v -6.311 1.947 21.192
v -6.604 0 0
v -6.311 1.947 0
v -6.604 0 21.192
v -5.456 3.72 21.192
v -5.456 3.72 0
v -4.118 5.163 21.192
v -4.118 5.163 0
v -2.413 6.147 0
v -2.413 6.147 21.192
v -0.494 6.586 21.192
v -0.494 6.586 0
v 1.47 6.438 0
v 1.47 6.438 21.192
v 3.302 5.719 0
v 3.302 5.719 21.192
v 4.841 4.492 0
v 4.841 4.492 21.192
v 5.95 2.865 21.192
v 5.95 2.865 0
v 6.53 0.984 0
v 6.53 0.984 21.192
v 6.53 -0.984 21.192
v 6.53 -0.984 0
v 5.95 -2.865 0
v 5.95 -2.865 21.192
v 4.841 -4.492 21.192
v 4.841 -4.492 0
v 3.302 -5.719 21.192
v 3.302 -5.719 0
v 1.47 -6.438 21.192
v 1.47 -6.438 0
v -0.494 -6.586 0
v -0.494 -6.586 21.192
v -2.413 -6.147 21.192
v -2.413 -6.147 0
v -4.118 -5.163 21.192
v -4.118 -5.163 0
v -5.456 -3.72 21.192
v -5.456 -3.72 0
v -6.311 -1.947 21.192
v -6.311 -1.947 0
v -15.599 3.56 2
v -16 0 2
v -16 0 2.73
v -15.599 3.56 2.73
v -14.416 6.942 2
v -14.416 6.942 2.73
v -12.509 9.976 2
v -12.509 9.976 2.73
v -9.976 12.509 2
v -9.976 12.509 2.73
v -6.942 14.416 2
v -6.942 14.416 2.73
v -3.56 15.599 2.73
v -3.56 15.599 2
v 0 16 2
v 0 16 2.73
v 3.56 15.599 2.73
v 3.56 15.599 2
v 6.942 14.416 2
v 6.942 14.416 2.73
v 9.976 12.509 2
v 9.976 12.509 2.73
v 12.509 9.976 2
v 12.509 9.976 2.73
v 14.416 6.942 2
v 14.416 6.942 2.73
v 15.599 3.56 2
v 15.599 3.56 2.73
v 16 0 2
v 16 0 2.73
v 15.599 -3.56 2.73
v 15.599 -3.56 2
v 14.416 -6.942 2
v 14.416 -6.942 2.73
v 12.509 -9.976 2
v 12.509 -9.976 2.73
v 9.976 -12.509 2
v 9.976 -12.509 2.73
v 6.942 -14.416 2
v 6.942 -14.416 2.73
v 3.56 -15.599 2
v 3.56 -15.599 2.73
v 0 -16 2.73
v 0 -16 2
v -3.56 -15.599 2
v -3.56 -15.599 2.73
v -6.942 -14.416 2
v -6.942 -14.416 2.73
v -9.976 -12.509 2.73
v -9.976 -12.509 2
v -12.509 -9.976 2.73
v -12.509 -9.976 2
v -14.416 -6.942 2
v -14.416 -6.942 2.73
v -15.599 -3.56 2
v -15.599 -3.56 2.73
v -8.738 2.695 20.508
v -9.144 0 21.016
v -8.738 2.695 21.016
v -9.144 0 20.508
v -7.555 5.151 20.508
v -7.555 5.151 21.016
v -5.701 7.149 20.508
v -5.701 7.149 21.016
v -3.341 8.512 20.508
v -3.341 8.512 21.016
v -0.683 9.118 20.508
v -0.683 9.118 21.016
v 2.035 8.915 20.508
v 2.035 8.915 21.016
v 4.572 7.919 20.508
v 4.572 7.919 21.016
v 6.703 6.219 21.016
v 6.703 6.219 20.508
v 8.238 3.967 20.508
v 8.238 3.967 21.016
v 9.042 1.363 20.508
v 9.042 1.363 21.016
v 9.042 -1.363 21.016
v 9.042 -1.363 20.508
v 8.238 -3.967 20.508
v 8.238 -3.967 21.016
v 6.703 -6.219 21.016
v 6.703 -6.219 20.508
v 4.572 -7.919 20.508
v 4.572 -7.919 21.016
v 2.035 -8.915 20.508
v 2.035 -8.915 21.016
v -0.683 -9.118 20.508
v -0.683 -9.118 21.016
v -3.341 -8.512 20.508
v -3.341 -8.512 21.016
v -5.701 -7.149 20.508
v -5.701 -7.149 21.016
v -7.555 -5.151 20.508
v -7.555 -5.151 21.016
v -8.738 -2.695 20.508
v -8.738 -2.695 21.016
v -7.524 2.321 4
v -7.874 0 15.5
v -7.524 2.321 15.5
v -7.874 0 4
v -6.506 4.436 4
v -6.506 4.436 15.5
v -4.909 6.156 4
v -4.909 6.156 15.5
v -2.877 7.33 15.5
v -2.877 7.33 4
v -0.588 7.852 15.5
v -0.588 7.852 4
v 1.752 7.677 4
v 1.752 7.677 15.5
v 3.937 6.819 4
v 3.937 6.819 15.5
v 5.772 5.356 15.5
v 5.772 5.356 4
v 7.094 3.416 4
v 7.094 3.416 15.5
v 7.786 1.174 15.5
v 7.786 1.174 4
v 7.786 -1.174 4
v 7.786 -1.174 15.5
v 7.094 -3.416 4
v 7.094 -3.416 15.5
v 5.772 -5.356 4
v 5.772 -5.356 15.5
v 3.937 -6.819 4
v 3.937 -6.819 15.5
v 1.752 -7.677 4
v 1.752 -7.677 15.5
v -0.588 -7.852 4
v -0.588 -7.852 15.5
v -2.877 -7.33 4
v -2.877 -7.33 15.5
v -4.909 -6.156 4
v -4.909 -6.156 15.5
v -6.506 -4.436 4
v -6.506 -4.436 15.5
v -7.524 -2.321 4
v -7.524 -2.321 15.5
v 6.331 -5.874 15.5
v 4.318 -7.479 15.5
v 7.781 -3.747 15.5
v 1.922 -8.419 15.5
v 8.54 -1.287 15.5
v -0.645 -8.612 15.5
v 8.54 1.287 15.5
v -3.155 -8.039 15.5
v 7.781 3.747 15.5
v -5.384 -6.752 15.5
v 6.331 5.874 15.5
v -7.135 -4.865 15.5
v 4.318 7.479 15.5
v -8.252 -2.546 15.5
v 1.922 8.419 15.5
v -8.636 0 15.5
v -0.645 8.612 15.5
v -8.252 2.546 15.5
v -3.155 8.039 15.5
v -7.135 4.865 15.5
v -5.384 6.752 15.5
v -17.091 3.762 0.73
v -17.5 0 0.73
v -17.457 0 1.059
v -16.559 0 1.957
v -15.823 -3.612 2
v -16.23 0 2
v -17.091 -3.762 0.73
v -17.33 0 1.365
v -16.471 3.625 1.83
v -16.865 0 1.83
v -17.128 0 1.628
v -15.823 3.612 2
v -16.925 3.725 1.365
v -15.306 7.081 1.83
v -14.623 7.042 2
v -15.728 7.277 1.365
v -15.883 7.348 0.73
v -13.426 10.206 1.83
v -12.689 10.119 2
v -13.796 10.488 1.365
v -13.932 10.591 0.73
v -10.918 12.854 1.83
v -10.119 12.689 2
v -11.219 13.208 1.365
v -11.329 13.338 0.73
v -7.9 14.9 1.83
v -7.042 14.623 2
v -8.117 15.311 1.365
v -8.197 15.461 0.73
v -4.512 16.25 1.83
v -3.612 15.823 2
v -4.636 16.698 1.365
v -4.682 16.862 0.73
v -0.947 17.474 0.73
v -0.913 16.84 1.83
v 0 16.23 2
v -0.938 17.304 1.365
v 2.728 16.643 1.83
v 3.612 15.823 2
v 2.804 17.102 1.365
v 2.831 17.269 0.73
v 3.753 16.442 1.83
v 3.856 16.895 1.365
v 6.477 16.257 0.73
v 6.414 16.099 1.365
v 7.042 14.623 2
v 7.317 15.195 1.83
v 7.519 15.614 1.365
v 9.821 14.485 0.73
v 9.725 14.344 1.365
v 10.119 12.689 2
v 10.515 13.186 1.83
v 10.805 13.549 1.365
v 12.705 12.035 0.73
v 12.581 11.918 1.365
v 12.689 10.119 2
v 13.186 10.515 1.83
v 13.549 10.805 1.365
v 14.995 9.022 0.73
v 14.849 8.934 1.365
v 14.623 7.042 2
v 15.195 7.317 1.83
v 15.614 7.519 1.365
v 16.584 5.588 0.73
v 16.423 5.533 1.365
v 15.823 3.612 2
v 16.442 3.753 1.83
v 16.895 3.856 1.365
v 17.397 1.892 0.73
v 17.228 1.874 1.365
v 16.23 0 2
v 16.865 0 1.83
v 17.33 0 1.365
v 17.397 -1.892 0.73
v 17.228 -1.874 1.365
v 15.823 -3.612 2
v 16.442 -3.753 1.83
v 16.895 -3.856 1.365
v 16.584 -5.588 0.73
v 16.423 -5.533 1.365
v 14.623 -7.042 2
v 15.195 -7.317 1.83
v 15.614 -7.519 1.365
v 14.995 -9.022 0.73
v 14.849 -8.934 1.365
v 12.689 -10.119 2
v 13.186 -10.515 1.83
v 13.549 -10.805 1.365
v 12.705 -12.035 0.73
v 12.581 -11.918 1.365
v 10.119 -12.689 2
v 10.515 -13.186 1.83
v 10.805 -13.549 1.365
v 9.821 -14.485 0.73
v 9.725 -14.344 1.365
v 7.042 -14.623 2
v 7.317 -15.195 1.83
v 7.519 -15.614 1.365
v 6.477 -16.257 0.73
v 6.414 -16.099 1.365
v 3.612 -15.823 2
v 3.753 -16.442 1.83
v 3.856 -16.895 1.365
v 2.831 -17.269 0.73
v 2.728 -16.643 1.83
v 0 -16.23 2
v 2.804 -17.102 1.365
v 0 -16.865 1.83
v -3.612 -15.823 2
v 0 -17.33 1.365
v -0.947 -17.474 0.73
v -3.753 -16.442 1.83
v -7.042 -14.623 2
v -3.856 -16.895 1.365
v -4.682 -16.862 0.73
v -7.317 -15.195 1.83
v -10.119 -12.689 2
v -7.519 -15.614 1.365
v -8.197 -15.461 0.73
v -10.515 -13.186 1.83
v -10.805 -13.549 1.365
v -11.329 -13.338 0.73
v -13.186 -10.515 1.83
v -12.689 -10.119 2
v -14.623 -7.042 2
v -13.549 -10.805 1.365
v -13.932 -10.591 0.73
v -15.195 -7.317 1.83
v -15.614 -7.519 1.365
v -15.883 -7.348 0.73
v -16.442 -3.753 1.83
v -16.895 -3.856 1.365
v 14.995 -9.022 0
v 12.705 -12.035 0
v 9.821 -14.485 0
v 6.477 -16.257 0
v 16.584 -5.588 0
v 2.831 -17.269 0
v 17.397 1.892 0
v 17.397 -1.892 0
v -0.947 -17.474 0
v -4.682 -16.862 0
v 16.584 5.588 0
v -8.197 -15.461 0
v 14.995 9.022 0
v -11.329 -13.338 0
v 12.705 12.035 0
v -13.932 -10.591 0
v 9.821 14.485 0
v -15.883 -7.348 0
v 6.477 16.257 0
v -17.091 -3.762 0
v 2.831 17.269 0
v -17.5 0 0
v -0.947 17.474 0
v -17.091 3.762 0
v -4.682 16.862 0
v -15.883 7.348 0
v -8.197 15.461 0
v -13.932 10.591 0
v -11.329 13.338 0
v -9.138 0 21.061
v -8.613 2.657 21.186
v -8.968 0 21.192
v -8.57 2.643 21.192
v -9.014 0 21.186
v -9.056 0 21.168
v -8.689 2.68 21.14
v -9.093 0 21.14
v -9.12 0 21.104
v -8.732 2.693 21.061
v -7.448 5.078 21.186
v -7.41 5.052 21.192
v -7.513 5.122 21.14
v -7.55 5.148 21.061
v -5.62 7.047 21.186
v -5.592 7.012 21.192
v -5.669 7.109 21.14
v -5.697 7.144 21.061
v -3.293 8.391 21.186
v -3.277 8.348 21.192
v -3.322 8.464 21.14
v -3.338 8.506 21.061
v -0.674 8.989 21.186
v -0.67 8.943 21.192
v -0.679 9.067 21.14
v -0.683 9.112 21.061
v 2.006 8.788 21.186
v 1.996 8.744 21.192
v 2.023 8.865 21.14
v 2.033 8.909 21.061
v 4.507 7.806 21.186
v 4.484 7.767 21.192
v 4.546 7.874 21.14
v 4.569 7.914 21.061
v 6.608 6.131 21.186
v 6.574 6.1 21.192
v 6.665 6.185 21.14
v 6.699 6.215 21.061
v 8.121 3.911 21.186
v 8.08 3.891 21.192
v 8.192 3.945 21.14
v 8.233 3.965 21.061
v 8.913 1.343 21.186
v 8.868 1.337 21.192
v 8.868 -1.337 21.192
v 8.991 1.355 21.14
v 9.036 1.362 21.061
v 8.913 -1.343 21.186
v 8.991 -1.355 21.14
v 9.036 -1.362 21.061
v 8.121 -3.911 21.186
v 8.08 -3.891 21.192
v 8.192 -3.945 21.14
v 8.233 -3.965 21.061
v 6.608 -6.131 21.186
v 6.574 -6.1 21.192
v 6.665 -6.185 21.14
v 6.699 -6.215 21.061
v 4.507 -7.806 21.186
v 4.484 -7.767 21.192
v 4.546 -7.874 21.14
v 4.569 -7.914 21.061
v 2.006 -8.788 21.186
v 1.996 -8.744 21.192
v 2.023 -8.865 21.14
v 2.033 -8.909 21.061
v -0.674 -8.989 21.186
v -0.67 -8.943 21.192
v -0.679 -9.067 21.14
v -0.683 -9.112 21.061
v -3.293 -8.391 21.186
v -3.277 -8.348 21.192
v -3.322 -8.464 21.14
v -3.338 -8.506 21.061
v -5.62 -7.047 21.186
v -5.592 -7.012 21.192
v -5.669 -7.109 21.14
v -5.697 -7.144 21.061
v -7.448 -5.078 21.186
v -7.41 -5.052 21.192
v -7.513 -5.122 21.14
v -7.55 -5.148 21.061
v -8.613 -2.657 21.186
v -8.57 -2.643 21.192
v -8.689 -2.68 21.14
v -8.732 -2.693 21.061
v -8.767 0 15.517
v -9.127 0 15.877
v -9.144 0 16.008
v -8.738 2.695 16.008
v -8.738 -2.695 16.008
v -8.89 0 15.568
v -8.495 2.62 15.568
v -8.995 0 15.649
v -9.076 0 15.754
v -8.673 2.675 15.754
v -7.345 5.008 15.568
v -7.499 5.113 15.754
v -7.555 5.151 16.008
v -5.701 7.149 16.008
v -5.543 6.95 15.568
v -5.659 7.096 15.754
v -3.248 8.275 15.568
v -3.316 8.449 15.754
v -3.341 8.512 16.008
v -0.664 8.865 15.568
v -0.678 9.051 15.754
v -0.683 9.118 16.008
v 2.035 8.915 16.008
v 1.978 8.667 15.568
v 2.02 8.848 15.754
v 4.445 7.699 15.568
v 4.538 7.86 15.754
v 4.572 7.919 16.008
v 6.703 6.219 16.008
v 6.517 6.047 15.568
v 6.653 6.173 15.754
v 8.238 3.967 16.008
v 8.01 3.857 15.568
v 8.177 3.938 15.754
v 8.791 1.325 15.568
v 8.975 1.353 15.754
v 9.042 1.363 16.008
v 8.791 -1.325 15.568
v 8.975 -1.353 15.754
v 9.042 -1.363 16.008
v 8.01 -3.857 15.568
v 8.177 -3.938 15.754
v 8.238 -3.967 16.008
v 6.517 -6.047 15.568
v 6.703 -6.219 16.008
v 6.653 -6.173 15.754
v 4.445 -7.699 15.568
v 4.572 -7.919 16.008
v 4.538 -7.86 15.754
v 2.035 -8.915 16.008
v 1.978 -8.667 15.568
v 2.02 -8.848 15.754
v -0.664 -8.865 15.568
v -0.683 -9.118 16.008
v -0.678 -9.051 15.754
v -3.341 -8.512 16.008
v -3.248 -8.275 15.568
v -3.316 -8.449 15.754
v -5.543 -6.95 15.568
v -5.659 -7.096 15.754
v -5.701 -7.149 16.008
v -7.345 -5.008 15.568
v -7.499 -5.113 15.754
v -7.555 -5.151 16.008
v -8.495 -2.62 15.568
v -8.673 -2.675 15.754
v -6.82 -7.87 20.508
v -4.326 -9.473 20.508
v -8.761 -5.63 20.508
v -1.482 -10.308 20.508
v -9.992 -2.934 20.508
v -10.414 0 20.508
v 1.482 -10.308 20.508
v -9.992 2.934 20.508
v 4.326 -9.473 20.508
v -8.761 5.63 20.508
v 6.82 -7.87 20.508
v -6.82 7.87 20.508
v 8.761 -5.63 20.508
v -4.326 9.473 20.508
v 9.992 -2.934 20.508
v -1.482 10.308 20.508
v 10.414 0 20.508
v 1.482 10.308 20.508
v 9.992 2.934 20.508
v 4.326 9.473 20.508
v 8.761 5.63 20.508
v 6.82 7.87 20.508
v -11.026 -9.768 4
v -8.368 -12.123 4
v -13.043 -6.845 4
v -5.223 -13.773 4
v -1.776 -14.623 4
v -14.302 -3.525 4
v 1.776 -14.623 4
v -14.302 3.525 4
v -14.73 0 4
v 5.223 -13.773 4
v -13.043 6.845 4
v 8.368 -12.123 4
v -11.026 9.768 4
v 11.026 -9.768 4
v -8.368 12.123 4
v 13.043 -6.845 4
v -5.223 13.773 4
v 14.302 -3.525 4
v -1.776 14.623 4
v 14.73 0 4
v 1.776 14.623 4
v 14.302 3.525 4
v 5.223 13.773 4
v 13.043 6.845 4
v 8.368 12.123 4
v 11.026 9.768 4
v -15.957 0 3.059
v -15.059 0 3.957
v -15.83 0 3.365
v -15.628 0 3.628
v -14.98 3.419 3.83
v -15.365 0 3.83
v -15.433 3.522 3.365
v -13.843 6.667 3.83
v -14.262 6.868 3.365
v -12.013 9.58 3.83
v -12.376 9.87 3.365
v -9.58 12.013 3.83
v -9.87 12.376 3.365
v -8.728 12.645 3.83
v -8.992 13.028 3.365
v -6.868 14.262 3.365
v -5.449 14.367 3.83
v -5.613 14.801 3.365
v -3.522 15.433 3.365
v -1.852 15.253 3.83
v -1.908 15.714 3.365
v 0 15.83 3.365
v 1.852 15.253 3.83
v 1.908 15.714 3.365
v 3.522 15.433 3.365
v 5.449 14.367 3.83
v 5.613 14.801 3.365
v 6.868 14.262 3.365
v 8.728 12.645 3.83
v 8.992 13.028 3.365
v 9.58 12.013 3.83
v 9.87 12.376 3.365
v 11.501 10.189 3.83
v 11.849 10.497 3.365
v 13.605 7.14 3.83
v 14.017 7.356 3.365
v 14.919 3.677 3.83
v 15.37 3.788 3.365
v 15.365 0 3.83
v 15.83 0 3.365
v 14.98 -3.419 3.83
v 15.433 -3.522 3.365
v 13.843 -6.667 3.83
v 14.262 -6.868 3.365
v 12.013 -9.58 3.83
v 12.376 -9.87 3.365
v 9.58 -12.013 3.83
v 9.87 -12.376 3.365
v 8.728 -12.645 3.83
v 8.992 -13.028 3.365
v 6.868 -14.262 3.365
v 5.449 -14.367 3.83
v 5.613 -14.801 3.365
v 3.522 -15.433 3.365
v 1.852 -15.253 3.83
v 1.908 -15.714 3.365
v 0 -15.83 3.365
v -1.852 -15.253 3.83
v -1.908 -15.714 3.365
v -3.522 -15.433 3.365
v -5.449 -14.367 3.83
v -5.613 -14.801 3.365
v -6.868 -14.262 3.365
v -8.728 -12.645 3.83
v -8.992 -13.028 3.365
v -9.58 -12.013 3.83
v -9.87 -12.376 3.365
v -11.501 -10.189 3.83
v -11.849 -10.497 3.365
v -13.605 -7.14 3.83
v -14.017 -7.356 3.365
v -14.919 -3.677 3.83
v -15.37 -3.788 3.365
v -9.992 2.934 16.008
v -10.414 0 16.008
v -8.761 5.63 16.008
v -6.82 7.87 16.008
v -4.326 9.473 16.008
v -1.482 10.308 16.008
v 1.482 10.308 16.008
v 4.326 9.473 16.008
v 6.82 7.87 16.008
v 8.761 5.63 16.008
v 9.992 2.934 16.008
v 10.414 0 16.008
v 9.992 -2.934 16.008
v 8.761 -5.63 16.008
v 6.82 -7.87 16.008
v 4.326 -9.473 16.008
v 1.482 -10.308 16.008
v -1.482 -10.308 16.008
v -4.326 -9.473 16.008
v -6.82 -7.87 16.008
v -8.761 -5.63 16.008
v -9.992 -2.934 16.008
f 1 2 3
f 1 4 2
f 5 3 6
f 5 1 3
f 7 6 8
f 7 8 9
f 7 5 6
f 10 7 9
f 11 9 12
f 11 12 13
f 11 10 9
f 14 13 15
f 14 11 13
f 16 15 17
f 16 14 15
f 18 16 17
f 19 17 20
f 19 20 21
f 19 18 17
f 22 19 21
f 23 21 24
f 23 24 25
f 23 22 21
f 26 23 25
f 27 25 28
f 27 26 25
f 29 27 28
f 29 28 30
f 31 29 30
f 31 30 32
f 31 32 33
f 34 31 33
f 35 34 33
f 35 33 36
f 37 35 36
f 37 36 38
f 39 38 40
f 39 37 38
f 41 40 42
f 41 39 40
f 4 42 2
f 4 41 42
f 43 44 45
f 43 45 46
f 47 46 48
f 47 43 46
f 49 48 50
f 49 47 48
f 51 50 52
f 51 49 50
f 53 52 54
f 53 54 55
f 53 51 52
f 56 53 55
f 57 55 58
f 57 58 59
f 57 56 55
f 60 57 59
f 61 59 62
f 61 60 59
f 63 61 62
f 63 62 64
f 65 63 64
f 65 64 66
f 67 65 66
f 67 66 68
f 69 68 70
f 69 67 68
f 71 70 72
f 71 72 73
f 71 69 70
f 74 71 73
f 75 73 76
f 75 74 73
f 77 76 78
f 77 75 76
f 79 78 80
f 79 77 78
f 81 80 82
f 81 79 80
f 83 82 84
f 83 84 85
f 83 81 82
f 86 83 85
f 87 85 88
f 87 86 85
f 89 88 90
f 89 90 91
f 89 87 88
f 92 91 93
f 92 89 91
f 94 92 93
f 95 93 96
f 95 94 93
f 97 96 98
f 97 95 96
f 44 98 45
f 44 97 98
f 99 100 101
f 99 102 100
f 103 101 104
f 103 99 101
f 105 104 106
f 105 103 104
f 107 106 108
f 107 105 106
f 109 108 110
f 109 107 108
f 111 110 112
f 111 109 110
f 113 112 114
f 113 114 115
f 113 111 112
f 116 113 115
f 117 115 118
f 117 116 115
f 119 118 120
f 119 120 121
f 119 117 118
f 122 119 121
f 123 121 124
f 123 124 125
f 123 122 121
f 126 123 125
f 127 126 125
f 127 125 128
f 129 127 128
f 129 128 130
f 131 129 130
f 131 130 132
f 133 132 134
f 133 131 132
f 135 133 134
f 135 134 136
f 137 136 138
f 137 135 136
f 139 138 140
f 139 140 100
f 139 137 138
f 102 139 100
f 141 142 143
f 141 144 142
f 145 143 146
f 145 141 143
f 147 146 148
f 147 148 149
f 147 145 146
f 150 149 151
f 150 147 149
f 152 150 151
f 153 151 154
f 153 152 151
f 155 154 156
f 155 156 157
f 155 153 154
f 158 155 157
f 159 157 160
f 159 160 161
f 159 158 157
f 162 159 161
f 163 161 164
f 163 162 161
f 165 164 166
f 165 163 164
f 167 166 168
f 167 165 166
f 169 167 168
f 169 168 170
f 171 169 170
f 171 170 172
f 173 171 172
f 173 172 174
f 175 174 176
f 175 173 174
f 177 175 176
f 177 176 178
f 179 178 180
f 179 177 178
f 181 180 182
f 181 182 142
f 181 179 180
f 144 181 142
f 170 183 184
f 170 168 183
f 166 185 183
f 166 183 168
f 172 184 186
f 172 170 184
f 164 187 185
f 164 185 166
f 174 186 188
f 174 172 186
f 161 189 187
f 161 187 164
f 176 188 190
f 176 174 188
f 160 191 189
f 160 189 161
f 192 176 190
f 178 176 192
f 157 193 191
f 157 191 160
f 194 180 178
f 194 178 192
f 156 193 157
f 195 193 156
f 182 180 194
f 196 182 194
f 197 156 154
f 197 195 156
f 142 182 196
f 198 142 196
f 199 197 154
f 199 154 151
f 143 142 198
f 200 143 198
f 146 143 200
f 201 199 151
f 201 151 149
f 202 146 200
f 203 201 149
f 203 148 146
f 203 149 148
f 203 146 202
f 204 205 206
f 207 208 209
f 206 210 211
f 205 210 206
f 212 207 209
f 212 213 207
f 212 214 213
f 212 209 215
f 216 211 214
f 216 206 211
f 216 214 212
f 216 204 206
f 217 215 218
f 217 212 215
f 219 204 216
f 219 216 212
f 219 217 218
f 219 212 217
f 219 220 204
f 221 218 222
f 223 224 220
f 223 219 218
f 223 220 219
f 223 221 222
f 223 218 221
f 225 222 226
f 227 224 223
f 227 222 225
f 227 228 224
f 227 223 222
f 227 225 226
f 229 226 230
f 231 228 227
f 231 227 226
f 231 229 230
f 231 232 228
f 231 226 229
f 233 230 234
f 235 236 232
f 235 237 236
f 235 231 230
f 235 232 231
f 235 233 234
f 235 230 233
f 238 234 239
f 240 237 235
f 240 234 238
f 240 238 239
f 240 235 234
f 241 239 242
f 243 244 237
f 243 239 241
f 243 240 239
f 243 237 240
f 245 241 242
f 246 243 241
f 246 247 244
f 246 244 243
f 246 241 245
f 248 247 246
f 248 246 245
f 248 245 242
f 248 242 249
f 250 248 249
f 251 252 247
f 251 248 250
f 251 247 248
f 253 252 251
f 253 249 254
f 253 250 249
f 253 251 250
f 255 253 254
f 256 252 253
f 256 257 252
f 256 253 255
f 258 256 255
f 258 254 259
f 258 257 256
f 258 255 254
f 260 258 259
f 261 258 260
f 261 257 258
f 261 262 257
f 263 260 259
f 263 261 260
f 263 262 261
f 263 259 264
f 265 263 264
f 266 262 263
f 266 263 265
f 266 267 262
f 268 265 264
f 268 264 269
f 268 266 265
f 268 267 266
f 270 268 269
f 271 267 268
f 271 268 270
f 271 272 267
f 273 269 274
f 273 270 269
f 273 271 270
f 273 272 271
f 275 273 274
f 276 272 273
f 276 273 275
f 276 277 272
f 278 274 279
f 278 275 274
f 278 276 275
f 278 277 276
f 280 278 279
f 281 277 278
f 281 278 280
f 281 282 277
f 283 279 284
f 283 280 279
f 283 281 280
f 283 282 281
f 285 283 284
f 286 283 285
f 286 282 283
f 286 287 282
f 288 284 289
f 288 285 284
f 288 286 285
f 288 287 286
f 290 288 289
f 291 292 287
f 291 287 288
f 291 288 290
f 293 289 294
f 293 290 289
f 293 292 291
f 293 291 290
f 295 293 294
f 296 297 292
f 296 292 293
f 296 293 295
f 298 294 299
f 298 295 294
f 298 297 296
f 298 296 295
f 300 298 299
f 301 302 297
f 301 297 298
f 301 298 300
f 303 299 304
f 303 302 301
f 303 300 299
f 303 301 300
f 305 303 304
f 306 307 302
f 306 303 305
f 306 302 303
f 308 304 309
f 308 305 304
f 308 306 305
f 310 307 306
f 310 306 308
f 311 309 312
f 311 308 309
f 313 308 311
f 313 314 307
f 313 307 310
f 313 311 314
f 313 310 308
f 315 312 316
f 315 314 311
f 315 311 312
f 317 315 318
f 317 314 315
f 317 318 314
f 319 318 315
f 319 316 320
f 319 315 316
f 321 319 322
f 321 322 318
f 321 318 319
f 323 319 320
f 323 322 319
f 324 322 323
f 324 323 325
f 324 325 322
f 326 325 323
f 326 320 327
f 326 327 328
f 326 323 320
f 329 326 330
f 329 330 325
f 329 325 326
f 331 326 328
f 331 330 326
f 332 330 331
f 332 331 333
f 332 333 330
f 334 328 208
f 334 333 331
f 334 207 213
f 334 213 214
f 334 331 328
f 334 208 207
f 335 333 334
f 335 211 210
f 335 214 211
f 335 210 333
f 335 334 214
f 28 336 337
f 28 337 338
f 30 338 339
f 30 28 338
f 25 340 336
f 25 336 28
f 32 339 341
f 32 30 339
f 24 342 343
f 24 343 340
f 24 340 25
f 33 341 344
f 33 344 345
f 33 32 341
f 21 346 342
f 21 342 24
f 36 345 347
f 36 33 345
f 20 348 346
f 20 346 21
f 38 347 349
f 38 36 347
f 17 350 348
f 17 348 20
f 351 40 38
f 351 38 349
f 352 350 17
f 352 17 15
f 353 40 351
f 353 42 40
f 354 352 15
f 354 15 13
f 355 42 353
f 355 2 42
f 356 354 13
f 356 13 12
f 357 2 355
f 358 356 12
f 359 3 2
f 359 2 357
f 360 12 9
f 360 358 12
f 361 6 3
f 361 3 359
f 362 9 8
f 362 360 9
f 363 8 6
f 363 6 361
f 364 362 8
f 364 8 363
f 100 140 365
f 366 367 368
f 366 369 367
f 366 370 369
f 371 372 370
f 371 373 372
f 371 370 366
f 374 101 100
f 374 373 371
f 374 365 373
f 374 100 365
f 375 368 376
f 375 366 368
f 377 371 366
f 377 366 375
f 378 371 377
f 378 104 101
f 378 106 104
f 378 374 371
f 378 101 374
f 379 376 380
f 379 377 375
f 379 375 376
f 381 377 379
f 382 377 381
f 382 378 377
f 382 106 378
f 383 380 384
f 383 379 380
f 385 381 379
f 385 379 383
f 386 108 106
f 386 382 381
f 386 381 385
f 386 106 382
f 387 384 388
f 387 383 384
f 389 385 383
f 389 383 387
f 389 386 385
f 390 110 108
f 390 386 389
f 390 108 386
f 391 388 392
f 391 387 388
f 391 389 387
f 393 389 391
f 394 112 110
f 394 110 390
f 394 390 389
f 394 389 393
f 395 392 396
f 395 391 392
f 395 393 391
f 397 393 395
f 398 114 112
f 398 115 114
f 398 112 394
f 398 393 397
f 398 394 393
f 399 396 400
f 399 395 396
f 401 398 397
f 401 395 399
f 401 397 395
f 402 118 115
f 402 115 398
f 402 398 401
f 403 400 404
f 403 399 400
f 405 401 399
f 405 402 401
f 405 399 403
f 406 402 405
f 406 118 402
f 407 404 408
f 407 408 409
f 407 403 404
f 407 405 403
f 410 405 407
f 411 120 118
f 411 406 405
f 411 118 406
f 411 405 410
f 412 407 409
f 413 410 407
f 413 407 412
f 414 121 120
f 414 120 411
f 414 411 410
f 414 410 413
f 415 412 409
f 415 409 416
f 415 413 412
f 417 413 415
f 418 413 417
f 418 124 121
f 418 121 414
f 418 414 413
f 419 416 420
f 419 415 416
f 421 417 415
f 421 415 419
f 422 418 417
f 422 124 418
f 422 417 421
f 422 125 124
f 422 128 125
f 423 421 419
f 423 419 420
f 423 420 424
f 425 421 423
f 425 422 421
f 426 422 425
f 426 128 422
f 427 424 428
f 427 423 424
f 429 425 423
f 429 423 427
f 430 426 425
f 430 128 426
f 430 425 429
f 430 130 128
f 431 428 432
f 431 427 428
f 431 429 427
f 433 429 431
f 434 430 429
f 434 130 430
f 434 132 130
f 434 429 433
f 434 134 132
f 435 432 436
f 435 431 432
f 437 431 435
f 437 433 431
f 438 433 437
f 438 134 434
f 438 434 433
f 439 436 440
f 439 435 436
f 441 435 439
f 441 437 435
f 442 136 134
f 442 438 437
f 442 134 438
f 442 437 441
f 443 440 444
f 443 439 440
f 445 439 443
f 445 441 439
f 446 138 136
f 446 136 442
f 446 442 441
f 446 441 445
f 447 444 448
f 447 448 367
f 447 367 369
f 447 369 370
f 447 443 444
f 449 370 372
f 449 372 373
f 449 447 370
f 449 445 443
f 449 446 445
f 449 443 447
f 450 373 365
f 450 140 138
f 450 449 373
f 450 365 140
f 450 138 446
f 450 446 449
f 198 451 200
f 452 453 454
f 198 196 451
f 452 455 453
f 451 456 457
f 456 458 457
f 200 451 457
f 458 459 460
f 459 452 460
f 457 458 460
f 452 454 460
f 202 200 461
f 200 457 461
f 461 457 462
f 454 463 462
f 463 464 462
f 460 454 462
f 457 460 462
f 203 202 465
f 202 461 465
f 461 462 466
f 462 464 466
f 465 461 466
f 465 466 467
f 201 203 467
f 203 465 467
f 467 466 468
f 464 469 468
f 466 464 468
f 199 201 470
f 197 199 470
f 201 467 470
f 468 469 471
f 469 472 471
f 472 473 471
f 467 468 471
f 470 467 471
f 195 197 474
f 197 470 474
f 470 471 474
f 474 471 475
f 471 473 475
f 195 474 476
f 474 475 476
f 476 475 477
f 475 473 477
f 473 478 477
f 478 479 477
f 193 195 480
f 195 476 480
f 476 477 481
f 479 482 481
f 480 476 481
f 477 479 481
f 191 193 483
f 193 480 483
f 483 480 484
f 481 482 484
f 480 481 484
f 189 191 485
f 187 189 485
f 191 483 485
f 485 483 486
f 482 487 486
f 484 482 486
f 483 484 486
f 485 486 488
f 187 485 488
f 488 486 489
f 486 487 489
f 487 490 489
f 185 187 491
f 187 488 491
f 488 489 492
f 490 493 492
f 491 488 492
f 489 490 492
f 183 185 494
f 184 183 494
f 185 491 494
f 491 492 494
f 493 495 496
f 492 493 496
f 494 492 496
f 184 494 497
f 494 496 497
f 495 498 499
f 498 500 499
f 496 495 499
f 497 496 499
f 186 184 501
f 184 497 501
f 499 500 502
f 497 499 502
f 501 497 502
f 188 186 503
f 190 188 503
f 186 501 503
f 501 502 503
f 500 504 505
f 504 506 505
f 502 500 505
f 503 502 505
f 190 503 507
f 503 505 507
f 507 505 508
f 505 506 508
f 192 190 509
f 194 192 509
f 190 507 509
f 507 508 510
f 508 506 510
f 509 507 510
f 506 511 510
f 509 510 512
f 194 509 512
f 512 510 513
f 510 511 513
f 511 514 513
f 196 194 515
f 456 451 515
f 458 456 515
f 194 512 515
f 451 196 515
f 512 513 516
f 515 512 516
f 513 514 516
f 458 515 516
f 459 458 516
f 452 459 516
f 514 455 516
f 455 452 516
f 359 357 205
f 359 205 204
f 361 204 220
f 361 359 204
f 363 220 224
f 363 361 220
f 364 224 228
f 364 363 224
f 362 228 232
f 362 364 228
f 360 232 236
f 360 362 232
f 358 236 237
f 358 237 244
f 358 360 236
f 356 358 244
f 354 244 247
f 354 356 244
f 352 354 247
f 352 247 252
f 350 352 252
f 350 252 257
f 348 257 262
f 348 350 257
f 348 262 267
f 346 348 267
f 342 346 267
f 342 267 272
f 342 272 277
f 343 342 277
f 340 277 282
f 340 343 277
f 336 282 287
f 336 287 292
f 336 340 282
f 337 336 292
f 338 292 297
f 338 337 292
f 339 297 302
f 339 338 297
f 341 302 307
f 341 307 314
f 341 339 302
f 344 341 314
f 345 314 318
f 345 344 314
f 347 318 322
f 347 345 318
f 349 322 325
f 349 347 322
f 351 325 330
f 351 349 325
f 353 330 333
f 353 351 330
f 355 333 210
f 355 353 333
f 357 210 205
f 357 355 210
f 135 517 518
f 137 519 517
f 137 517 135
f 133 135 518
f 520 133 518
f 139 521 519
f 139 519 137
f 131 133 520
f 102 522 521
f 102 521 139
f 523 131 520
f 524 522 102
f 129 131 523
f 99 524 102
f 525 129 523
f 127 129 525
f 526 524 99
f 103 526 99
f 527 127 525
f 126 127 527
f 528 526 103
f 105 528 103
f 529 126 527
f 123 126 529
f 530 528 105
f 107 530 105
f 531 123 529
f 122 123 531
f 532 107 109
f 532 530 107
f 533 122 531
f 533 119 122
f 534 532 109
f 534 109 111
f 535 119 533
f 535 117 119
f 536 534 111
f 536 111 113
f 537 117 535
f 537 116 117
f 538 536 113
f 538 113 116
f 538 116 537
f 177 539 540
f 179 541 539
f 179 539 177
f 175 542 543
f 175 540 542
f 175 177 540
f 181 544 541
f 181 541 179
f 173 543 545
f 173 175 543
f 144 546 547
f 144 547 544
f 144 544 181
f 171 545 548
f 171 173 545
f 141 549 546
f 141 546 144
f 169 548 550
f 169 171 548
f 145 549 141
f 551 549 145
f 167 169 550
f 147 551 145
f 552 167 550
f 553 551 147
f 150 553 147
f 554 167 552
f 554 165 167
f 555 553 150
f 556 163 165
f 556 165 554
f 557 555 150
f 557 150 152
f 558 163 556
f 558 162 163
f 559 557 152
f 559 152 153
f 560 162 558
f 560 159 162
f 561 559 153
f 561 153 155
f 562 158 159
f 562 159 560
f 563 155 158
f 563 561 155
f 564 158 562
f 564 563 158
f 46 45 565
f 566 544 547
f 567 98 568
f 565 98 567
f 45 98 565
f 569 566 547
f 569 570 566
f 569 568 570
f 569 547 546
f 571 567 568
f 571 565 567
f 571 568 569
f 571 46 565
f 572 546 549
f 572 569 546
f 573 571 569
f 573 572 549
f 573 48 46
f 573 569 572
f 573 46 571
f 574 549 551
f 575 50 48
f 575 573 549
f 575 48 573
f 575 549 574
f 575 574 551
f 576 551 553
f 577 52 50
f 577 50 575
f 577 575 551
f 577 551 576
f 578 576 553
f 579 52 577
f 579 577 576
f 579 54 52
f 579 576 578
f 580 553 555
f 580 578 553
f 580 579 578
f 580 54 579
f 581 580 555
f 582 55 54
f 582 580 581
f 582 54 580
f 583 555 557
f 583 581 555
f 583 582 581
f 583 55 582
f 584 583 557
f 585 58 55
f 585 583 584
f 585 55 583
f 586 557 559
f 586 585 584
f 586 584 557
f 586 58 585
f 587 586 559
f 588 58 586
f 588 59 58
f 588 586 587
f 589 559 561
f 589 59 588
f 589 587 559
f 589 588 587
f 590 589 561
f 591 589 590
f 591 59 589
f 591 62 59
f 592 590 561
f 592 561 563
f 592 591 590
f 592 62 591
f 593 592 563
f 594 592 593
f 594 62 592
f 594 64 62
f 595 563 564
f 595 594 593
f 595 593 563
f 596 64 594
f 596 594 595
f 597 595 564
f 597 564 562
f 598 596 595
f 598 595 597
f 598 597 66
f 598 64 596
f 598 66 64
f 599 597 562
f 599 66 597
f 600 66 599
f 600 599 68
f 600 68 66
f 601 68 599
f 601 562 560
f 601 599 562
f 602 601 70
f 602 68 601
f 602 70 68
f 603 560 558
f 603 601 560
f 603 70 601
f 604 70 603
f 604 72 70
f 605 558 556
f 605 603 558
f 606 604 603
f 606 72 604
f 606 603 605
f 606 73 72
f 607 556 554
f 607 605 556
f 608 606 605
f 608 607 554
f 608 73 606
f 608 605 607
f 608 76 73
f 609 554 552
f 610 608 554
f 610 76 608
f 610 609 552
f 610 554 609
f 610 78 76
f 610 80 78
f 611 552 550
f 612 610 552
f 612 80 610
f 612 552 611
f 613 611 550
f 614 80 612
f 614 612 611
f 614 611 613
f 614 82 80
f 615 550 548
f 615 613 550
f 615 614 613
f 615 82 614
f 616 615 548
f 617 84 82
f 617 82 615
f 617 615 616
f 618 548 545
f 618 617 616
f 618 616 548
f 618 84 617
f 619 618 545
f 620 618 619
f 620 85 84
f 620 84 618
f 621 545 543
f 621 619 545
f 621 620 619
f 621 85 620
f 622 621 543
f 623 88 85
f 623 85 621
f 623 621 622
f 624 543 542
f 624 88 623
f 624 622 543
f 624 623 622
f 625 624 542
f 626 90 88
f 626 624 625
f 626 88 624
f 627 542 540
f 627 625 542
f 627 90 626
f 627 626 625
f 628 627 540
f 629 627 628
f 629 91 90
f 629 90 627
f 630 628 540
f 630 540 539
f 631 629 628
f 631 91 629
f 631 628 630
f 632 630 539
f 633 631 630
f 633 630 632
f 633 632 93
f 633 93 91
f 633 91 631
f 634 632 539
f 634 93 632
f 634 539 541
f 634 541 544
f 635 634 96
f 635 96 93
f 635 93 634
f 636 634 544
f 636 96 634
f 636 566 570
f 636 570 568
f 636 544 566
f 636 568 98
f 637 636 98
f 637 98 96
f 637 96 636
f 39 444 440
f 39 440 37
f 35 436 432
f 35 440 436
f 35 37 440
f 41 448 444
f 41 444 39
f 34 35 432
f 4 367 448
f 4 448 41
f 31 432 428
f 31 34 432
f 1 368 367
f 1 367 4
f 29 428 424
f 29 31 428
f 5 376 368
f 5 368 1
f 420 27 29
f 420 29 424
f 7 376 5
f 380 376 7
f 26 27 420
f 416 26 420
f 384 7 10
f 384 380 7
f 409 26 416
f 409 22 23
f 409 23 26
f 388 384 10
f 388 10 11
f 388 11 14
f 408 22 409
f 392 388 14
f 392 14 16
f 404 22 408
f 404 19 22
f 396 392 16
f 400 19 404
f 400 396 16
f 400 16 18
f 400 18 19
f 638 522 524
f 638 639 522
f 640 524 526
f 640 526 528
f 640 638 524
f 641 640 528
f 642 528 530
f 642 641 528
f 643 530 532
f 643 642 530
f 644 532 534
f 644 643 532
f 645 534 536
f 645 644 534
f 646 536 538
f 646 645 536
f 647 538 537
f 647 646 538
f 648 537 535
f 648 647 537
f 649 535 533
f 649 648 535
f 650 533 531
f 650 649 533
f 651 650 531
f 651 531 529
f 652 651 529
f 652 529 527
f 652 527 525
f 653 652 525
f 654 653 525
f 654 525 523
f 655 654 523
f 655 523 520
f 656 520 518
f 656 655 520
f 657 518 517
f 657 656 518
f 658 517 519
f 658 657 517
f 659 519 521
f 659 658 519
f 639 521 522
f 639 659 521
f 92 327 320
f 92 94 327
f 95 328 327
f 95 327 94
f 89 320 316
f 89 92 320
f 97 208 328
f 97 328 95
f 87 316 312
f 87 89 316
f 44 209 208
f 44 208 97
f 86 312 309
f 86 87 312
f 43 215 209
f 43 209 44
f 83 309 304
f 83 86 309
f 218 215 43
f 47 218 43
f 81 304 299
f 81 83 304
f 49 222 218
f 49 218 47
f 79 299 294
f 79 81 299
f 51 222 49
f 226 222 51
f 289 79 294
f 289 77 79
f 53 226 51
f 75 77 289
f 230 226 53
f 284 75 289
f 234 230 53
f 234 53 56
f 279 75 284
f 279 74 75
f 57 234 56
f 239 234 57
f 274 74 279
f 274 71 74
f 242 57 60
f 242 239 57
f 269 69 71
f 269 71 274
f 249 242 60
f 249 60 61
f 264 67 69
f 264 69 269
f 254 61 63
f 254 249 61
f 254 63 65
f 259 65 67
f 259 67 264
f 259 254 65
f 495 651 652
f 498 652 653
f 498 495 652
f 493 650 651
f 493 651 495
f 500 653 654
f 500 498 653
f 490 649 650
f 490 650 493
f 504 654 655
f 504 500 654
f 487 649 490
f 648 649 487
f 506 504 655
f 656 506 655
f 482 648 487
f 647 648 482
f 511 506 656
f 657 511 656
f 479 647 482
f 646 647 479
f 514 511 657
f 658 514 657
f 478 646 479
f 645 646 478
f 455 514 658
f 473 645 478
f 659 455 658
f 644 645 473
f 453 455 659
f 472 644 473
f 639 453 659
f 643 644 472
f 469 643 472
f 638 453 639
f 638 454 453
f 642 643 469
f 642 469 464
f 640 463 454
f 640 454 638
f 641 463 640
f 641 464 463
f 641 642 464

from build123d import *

# Parameters (mm, degrees)
F2_R = 1.27
F3_R = 0.50799


# Not quite as in the source:
# - a fillet or chamfer is up to 0.001 mm smaller than in the source, because OpenCascade refuses the exact size


with BuildPart() as f1:
    # F0 (on Front) → F1 (revolve)
    with BuildSketch(Plane.XZ):
        with BuildLine():
            Line((-17.5, 0), (-6.604, 0))
            Line((-6.604, 0), (-6.604, 21.1916357695))
            Line((-6.604, 21.1916357695), (-8.9683642305, 21.1916357695))
            ThreePointArc((-8.9683642305, 21.1916357695), (-9.0925574741, 21.1401932437), (-9.144, 21.016))
            Line((-9.144, 21.016), (-9.144, 20.508))
            Line((-9.144, 20.508), (-10.414, 20.508))
            Line((-10.414, 20.508), (-10.414, 16.008))
            Line((-10.414, 16.008), (-9.144, 16.008))
            Line((-9.144, 16.008), (-9.144, 15.5))
            Line((-9.144, 15.5), (-7.874, 15.5))
            Line((-7.874, 15.5), (-7.874, 4))
            Line((-7.874, 4), (-16, 4))
            Line((-16, 4), (-16, 2))
            Line((-16, 2), (-17.5, 2))
            Line((-17.5, 2), (-17.5, 0))
        make_face()
    revolve(axis=Axis((0, 0, 10.5958178848), (0, 0, -1)))

    # F2
    f2_edges = [f1.edges().sort_by_distance(p)[0] for p in [
        (16, 0, 4),
        (17.5, 0, 2),
    ]]
    fillet(f2_edges, radius=F2_R)

    # F3 (radius 0.508 in the source; OpenCascade refuses exactly that, so slightly less here)
    f3_edges = [f1.edges().sort_by_distance(p)[0] for p in [
        (9.144, 0, 15.5),
    ]]
    fillet(f3_edges, radius=F3_R)


solid = f1.part
